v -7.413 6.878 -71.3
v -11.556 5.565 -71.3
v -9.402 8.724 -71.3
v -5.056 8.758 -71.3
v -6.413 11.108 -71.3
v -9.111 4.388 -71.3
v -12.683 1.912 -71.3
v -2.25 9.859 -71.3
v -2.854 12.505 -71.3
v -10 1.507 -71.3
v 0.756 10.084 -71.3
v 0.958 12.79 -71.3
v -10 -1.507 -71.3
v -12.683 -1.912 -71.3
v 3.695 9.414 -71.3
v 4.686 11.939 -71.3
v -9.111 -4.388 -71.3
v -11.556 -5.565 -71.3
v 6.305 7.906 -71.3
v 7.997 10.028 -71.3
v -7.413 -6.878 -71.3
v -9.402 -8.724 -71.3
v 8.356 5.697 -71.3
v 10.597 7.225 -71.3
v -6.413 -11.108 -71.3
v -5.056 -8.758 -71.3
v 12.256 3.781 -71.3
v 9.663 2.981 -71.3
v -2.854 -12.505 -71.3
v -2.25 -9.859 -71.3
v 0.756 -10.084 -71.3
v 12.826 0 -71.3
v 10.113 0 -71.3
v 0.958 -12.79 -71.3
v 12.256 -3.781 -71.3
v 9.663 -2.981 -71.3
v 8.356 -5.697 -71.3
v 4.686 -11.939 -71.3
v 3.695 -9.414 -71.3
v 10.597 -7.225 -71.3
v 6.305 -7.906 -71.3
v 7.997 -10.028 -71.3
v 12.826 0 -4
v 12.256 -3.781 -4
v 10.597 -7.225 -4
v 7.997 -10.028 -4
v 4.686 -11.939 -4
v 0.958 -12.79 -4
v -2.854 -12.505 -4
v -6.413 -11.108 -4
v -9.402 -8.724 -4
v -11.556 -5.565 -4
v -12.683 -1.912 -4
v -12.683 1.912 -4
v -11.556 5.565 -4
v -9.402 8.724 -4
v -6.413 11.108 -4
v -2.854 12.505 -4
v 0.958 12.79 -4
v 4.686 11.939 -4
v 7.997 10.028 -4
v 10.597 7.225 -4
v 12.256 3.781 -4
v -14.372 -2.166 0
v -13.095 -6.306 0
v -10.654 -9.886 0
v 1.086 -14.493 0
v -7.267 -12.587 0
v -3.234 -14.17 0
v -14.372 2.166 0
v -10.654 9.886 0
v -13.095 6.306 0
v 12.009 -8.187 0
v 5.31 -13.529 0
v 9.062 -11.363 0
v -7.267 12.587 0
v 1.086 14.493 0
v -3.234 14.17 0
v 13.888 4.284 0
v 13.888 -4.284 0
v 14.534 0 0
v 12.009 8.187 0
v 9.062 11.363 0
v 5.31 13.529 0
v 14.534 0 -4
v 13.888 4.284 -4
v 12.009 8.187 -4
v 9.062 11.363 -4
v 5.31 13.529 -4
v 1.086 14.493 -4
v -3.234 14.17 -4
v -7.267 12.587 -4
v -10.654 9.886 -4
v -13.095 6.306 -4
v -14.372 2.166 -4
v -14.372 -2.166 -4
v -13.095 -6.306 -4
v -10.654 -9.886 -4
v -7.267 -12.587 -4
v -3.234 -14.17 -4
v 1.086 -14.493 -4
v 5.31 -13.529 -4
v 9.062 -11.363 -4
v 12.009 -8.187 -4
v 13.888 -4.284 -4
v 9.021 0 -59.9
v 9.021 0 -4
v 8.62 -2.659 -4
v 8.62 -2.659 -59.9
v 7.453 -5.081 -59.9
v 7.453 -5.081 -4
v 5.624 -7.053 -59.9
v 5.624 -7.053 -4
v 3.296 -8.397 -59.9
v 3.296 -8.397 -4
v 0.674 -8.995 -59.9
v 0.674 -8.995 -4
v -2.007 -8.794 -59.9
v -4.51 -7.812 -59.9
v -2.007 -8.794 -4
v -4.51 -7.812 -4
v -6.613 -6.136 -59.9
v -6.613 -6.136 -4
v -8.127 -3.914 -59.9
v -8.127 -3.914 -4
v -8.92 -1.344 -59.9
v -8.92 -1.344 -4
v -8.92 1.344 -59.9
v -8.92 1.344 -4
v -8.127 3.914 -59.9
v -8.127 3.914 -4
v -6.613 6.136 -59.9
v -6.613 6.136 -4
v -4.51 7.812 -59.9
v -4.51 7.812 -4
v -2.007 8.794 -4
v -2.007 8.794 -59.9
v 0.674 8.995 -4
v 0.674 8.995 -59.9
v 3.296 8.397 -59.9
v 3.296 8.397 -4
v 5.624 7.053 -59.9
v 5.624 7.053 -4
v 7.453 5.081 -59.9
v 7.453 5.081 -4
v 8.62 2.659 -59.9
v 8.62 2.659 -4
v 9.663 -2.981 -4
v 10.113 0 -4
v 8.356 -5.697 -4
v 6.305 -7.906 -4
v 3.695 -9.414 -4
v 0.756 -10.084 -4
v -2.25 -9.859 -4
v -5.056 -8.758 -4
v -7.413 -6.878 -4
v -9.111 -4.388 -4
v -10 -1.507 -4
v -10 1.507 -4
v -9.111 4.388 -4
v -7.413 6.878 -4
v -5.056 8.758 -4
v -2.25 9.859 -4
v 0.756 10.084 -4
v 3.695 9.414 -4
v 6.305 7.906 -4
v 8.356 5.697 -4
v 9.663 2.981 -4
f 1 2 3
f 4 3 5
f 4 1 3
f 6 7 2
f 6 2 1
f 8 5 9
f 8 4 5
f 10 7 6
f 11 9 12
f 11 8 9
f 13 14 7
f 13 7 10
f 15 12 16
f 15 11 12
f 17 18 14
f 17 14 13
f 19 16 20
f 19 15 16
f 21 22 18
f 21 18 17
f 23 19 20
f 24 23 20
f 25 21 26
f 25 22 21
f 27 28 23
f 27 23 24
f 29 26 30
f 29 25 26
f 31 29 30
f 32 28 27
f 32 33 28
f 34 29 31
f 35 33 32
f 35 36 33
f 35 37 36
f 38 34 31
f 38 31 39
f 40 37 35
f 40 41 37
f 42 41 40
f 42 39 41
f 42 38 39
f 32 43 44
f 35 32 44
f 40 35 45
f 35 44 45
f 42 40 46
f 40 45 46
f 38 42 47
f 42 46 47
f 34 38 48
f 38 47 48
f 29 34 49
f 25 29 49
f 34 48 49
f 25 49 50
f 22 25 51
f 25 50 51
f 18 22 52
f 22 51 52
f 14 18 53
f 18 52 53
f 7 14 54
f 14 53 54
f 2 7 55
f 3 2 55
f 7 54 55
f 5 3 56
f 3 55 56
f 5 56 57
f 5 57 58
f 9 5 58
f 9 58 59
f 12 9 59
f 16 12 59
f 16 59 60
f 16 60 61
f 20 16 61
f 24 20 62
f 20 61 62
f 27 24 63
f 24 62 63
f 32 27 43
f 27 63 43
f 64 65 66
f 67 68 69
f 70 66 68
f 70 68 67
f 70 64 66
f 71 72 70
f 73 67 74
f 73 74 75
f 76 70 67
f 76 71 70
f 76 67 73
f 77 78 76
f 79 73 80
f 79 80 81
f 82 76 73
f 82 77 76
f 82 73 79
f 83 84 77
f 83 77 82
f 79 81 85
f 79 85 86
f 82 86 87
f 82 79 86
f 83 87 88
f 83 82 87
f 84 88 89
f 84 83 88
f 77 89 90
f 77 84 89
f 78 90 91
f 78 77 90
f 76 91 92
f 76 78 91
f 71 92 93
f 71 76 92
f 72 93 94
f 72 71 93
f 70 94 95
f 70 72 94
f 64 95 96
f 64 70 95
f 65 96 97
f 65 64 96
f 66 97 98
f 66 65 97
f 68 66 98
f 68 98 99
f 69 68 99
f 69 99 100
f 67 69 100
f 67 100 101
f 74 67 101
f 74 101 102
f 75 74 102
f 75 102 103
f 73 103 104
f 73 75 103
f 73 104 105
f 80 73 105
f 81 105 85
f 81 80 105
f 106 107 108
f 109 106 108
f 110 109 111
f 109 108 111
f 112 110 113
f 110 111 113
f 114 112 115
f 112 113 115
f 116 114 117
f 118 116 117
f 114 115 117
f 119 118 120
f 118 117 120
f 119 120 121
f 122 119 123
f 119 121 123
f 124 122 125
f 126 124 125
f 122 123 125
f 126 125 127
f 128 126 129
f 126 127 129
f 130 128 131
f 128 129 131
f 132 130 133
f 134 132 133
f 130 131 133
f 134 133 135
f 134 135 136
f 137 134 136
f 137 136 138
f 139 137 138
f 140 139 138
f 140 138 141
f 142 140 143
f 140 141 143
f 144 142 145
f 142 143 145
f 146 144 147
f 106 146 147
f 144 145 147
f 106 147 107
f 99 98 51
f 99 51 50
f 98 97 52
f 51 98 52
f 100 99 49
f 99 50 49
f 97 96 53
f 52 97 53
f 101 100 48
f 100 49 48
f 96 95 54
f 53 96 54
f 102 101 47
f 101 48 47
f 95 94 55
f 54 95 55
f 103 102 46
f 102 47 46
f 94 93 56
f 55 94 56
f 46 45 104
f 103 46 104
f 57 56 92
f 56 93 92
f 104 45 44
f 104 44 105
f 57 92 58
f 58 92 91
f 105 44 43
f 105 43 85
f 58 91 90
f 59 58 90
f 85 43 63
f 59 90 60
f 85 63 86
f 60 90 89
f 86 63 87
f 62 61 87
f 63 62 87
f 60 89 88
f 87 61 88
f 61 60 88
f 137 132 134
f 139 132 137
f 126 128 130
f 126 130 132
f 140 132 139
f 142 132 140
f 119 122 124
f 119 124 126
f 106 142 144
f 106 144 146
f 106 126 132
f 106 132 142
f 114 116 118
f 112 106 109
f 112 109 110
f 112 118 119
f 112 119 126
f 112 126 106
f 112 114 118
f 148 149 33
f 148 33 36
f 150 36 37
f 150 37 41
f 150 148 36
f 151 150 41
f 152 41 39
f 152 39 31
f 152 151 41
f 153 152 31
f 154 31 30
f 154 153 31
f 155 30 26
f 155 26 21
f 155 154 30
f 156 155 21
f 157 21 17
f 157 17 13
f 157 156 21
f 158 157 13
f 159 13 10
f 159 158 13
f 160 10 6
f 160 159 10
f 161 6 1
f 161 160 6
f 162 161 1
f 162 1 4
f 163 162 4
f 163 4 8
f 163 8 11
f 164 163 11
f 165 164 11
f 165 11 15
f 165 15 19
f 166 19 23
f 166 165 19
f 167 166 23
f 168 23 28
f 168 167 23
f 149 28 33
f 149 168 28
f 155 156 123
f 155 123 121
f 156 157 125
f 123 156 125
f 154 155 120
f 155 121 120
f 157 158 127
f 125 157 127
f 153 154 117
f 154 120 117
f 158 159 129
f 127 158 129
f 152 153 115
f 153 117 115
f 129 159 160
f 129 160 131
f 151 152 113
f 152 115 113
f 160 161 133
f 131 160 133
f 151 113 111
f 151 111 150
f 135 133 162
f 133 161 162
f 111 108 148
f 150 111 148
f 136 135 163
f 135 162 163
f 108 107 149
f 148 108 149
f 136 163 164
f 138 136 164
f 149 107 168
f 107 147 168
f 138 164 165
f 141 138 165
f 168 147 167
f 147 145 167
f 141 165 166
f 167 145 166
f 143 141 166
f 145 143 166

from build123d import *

# Parameters (mm, degrees)
F0_R     = 14.534071
F1_DEPTH = 4
F2_R     = 9.020601
F3_DEPTH = 55.9
F4_R     = 12.826106
F4_R_2   = 10.112728
F5_DEPTH = 67.3


with BuildPart() as f1:
    # F0 (on Top) → F1 (new body)
    with BuildSketch(Plane.XY):
        Circle(F0_R)
    extrude(amount=-F1_DEPTH)

    # F2 (on face) → F3 (join)
    with BuildSketch(Plane(origin=(0, 0, -4), x_dir=(1, 0, 0), z_dir=(0, 0, -1))):
        Circle(F2_R)
    extrude(amount=F3_DEPTH)

    # F4 (on face) → F5 (join)
    with BuildSketch(Plane(origin=(0, 0, -4), x_dir=(1, 0, 0), z_dir=(0, 0, -1))):
        Circle(F4_R)
        Circle(F4_R_2, mode=Mode.SUBTRACT)
    extrude(amount=F5_DEPTH)


solid = f1.part
